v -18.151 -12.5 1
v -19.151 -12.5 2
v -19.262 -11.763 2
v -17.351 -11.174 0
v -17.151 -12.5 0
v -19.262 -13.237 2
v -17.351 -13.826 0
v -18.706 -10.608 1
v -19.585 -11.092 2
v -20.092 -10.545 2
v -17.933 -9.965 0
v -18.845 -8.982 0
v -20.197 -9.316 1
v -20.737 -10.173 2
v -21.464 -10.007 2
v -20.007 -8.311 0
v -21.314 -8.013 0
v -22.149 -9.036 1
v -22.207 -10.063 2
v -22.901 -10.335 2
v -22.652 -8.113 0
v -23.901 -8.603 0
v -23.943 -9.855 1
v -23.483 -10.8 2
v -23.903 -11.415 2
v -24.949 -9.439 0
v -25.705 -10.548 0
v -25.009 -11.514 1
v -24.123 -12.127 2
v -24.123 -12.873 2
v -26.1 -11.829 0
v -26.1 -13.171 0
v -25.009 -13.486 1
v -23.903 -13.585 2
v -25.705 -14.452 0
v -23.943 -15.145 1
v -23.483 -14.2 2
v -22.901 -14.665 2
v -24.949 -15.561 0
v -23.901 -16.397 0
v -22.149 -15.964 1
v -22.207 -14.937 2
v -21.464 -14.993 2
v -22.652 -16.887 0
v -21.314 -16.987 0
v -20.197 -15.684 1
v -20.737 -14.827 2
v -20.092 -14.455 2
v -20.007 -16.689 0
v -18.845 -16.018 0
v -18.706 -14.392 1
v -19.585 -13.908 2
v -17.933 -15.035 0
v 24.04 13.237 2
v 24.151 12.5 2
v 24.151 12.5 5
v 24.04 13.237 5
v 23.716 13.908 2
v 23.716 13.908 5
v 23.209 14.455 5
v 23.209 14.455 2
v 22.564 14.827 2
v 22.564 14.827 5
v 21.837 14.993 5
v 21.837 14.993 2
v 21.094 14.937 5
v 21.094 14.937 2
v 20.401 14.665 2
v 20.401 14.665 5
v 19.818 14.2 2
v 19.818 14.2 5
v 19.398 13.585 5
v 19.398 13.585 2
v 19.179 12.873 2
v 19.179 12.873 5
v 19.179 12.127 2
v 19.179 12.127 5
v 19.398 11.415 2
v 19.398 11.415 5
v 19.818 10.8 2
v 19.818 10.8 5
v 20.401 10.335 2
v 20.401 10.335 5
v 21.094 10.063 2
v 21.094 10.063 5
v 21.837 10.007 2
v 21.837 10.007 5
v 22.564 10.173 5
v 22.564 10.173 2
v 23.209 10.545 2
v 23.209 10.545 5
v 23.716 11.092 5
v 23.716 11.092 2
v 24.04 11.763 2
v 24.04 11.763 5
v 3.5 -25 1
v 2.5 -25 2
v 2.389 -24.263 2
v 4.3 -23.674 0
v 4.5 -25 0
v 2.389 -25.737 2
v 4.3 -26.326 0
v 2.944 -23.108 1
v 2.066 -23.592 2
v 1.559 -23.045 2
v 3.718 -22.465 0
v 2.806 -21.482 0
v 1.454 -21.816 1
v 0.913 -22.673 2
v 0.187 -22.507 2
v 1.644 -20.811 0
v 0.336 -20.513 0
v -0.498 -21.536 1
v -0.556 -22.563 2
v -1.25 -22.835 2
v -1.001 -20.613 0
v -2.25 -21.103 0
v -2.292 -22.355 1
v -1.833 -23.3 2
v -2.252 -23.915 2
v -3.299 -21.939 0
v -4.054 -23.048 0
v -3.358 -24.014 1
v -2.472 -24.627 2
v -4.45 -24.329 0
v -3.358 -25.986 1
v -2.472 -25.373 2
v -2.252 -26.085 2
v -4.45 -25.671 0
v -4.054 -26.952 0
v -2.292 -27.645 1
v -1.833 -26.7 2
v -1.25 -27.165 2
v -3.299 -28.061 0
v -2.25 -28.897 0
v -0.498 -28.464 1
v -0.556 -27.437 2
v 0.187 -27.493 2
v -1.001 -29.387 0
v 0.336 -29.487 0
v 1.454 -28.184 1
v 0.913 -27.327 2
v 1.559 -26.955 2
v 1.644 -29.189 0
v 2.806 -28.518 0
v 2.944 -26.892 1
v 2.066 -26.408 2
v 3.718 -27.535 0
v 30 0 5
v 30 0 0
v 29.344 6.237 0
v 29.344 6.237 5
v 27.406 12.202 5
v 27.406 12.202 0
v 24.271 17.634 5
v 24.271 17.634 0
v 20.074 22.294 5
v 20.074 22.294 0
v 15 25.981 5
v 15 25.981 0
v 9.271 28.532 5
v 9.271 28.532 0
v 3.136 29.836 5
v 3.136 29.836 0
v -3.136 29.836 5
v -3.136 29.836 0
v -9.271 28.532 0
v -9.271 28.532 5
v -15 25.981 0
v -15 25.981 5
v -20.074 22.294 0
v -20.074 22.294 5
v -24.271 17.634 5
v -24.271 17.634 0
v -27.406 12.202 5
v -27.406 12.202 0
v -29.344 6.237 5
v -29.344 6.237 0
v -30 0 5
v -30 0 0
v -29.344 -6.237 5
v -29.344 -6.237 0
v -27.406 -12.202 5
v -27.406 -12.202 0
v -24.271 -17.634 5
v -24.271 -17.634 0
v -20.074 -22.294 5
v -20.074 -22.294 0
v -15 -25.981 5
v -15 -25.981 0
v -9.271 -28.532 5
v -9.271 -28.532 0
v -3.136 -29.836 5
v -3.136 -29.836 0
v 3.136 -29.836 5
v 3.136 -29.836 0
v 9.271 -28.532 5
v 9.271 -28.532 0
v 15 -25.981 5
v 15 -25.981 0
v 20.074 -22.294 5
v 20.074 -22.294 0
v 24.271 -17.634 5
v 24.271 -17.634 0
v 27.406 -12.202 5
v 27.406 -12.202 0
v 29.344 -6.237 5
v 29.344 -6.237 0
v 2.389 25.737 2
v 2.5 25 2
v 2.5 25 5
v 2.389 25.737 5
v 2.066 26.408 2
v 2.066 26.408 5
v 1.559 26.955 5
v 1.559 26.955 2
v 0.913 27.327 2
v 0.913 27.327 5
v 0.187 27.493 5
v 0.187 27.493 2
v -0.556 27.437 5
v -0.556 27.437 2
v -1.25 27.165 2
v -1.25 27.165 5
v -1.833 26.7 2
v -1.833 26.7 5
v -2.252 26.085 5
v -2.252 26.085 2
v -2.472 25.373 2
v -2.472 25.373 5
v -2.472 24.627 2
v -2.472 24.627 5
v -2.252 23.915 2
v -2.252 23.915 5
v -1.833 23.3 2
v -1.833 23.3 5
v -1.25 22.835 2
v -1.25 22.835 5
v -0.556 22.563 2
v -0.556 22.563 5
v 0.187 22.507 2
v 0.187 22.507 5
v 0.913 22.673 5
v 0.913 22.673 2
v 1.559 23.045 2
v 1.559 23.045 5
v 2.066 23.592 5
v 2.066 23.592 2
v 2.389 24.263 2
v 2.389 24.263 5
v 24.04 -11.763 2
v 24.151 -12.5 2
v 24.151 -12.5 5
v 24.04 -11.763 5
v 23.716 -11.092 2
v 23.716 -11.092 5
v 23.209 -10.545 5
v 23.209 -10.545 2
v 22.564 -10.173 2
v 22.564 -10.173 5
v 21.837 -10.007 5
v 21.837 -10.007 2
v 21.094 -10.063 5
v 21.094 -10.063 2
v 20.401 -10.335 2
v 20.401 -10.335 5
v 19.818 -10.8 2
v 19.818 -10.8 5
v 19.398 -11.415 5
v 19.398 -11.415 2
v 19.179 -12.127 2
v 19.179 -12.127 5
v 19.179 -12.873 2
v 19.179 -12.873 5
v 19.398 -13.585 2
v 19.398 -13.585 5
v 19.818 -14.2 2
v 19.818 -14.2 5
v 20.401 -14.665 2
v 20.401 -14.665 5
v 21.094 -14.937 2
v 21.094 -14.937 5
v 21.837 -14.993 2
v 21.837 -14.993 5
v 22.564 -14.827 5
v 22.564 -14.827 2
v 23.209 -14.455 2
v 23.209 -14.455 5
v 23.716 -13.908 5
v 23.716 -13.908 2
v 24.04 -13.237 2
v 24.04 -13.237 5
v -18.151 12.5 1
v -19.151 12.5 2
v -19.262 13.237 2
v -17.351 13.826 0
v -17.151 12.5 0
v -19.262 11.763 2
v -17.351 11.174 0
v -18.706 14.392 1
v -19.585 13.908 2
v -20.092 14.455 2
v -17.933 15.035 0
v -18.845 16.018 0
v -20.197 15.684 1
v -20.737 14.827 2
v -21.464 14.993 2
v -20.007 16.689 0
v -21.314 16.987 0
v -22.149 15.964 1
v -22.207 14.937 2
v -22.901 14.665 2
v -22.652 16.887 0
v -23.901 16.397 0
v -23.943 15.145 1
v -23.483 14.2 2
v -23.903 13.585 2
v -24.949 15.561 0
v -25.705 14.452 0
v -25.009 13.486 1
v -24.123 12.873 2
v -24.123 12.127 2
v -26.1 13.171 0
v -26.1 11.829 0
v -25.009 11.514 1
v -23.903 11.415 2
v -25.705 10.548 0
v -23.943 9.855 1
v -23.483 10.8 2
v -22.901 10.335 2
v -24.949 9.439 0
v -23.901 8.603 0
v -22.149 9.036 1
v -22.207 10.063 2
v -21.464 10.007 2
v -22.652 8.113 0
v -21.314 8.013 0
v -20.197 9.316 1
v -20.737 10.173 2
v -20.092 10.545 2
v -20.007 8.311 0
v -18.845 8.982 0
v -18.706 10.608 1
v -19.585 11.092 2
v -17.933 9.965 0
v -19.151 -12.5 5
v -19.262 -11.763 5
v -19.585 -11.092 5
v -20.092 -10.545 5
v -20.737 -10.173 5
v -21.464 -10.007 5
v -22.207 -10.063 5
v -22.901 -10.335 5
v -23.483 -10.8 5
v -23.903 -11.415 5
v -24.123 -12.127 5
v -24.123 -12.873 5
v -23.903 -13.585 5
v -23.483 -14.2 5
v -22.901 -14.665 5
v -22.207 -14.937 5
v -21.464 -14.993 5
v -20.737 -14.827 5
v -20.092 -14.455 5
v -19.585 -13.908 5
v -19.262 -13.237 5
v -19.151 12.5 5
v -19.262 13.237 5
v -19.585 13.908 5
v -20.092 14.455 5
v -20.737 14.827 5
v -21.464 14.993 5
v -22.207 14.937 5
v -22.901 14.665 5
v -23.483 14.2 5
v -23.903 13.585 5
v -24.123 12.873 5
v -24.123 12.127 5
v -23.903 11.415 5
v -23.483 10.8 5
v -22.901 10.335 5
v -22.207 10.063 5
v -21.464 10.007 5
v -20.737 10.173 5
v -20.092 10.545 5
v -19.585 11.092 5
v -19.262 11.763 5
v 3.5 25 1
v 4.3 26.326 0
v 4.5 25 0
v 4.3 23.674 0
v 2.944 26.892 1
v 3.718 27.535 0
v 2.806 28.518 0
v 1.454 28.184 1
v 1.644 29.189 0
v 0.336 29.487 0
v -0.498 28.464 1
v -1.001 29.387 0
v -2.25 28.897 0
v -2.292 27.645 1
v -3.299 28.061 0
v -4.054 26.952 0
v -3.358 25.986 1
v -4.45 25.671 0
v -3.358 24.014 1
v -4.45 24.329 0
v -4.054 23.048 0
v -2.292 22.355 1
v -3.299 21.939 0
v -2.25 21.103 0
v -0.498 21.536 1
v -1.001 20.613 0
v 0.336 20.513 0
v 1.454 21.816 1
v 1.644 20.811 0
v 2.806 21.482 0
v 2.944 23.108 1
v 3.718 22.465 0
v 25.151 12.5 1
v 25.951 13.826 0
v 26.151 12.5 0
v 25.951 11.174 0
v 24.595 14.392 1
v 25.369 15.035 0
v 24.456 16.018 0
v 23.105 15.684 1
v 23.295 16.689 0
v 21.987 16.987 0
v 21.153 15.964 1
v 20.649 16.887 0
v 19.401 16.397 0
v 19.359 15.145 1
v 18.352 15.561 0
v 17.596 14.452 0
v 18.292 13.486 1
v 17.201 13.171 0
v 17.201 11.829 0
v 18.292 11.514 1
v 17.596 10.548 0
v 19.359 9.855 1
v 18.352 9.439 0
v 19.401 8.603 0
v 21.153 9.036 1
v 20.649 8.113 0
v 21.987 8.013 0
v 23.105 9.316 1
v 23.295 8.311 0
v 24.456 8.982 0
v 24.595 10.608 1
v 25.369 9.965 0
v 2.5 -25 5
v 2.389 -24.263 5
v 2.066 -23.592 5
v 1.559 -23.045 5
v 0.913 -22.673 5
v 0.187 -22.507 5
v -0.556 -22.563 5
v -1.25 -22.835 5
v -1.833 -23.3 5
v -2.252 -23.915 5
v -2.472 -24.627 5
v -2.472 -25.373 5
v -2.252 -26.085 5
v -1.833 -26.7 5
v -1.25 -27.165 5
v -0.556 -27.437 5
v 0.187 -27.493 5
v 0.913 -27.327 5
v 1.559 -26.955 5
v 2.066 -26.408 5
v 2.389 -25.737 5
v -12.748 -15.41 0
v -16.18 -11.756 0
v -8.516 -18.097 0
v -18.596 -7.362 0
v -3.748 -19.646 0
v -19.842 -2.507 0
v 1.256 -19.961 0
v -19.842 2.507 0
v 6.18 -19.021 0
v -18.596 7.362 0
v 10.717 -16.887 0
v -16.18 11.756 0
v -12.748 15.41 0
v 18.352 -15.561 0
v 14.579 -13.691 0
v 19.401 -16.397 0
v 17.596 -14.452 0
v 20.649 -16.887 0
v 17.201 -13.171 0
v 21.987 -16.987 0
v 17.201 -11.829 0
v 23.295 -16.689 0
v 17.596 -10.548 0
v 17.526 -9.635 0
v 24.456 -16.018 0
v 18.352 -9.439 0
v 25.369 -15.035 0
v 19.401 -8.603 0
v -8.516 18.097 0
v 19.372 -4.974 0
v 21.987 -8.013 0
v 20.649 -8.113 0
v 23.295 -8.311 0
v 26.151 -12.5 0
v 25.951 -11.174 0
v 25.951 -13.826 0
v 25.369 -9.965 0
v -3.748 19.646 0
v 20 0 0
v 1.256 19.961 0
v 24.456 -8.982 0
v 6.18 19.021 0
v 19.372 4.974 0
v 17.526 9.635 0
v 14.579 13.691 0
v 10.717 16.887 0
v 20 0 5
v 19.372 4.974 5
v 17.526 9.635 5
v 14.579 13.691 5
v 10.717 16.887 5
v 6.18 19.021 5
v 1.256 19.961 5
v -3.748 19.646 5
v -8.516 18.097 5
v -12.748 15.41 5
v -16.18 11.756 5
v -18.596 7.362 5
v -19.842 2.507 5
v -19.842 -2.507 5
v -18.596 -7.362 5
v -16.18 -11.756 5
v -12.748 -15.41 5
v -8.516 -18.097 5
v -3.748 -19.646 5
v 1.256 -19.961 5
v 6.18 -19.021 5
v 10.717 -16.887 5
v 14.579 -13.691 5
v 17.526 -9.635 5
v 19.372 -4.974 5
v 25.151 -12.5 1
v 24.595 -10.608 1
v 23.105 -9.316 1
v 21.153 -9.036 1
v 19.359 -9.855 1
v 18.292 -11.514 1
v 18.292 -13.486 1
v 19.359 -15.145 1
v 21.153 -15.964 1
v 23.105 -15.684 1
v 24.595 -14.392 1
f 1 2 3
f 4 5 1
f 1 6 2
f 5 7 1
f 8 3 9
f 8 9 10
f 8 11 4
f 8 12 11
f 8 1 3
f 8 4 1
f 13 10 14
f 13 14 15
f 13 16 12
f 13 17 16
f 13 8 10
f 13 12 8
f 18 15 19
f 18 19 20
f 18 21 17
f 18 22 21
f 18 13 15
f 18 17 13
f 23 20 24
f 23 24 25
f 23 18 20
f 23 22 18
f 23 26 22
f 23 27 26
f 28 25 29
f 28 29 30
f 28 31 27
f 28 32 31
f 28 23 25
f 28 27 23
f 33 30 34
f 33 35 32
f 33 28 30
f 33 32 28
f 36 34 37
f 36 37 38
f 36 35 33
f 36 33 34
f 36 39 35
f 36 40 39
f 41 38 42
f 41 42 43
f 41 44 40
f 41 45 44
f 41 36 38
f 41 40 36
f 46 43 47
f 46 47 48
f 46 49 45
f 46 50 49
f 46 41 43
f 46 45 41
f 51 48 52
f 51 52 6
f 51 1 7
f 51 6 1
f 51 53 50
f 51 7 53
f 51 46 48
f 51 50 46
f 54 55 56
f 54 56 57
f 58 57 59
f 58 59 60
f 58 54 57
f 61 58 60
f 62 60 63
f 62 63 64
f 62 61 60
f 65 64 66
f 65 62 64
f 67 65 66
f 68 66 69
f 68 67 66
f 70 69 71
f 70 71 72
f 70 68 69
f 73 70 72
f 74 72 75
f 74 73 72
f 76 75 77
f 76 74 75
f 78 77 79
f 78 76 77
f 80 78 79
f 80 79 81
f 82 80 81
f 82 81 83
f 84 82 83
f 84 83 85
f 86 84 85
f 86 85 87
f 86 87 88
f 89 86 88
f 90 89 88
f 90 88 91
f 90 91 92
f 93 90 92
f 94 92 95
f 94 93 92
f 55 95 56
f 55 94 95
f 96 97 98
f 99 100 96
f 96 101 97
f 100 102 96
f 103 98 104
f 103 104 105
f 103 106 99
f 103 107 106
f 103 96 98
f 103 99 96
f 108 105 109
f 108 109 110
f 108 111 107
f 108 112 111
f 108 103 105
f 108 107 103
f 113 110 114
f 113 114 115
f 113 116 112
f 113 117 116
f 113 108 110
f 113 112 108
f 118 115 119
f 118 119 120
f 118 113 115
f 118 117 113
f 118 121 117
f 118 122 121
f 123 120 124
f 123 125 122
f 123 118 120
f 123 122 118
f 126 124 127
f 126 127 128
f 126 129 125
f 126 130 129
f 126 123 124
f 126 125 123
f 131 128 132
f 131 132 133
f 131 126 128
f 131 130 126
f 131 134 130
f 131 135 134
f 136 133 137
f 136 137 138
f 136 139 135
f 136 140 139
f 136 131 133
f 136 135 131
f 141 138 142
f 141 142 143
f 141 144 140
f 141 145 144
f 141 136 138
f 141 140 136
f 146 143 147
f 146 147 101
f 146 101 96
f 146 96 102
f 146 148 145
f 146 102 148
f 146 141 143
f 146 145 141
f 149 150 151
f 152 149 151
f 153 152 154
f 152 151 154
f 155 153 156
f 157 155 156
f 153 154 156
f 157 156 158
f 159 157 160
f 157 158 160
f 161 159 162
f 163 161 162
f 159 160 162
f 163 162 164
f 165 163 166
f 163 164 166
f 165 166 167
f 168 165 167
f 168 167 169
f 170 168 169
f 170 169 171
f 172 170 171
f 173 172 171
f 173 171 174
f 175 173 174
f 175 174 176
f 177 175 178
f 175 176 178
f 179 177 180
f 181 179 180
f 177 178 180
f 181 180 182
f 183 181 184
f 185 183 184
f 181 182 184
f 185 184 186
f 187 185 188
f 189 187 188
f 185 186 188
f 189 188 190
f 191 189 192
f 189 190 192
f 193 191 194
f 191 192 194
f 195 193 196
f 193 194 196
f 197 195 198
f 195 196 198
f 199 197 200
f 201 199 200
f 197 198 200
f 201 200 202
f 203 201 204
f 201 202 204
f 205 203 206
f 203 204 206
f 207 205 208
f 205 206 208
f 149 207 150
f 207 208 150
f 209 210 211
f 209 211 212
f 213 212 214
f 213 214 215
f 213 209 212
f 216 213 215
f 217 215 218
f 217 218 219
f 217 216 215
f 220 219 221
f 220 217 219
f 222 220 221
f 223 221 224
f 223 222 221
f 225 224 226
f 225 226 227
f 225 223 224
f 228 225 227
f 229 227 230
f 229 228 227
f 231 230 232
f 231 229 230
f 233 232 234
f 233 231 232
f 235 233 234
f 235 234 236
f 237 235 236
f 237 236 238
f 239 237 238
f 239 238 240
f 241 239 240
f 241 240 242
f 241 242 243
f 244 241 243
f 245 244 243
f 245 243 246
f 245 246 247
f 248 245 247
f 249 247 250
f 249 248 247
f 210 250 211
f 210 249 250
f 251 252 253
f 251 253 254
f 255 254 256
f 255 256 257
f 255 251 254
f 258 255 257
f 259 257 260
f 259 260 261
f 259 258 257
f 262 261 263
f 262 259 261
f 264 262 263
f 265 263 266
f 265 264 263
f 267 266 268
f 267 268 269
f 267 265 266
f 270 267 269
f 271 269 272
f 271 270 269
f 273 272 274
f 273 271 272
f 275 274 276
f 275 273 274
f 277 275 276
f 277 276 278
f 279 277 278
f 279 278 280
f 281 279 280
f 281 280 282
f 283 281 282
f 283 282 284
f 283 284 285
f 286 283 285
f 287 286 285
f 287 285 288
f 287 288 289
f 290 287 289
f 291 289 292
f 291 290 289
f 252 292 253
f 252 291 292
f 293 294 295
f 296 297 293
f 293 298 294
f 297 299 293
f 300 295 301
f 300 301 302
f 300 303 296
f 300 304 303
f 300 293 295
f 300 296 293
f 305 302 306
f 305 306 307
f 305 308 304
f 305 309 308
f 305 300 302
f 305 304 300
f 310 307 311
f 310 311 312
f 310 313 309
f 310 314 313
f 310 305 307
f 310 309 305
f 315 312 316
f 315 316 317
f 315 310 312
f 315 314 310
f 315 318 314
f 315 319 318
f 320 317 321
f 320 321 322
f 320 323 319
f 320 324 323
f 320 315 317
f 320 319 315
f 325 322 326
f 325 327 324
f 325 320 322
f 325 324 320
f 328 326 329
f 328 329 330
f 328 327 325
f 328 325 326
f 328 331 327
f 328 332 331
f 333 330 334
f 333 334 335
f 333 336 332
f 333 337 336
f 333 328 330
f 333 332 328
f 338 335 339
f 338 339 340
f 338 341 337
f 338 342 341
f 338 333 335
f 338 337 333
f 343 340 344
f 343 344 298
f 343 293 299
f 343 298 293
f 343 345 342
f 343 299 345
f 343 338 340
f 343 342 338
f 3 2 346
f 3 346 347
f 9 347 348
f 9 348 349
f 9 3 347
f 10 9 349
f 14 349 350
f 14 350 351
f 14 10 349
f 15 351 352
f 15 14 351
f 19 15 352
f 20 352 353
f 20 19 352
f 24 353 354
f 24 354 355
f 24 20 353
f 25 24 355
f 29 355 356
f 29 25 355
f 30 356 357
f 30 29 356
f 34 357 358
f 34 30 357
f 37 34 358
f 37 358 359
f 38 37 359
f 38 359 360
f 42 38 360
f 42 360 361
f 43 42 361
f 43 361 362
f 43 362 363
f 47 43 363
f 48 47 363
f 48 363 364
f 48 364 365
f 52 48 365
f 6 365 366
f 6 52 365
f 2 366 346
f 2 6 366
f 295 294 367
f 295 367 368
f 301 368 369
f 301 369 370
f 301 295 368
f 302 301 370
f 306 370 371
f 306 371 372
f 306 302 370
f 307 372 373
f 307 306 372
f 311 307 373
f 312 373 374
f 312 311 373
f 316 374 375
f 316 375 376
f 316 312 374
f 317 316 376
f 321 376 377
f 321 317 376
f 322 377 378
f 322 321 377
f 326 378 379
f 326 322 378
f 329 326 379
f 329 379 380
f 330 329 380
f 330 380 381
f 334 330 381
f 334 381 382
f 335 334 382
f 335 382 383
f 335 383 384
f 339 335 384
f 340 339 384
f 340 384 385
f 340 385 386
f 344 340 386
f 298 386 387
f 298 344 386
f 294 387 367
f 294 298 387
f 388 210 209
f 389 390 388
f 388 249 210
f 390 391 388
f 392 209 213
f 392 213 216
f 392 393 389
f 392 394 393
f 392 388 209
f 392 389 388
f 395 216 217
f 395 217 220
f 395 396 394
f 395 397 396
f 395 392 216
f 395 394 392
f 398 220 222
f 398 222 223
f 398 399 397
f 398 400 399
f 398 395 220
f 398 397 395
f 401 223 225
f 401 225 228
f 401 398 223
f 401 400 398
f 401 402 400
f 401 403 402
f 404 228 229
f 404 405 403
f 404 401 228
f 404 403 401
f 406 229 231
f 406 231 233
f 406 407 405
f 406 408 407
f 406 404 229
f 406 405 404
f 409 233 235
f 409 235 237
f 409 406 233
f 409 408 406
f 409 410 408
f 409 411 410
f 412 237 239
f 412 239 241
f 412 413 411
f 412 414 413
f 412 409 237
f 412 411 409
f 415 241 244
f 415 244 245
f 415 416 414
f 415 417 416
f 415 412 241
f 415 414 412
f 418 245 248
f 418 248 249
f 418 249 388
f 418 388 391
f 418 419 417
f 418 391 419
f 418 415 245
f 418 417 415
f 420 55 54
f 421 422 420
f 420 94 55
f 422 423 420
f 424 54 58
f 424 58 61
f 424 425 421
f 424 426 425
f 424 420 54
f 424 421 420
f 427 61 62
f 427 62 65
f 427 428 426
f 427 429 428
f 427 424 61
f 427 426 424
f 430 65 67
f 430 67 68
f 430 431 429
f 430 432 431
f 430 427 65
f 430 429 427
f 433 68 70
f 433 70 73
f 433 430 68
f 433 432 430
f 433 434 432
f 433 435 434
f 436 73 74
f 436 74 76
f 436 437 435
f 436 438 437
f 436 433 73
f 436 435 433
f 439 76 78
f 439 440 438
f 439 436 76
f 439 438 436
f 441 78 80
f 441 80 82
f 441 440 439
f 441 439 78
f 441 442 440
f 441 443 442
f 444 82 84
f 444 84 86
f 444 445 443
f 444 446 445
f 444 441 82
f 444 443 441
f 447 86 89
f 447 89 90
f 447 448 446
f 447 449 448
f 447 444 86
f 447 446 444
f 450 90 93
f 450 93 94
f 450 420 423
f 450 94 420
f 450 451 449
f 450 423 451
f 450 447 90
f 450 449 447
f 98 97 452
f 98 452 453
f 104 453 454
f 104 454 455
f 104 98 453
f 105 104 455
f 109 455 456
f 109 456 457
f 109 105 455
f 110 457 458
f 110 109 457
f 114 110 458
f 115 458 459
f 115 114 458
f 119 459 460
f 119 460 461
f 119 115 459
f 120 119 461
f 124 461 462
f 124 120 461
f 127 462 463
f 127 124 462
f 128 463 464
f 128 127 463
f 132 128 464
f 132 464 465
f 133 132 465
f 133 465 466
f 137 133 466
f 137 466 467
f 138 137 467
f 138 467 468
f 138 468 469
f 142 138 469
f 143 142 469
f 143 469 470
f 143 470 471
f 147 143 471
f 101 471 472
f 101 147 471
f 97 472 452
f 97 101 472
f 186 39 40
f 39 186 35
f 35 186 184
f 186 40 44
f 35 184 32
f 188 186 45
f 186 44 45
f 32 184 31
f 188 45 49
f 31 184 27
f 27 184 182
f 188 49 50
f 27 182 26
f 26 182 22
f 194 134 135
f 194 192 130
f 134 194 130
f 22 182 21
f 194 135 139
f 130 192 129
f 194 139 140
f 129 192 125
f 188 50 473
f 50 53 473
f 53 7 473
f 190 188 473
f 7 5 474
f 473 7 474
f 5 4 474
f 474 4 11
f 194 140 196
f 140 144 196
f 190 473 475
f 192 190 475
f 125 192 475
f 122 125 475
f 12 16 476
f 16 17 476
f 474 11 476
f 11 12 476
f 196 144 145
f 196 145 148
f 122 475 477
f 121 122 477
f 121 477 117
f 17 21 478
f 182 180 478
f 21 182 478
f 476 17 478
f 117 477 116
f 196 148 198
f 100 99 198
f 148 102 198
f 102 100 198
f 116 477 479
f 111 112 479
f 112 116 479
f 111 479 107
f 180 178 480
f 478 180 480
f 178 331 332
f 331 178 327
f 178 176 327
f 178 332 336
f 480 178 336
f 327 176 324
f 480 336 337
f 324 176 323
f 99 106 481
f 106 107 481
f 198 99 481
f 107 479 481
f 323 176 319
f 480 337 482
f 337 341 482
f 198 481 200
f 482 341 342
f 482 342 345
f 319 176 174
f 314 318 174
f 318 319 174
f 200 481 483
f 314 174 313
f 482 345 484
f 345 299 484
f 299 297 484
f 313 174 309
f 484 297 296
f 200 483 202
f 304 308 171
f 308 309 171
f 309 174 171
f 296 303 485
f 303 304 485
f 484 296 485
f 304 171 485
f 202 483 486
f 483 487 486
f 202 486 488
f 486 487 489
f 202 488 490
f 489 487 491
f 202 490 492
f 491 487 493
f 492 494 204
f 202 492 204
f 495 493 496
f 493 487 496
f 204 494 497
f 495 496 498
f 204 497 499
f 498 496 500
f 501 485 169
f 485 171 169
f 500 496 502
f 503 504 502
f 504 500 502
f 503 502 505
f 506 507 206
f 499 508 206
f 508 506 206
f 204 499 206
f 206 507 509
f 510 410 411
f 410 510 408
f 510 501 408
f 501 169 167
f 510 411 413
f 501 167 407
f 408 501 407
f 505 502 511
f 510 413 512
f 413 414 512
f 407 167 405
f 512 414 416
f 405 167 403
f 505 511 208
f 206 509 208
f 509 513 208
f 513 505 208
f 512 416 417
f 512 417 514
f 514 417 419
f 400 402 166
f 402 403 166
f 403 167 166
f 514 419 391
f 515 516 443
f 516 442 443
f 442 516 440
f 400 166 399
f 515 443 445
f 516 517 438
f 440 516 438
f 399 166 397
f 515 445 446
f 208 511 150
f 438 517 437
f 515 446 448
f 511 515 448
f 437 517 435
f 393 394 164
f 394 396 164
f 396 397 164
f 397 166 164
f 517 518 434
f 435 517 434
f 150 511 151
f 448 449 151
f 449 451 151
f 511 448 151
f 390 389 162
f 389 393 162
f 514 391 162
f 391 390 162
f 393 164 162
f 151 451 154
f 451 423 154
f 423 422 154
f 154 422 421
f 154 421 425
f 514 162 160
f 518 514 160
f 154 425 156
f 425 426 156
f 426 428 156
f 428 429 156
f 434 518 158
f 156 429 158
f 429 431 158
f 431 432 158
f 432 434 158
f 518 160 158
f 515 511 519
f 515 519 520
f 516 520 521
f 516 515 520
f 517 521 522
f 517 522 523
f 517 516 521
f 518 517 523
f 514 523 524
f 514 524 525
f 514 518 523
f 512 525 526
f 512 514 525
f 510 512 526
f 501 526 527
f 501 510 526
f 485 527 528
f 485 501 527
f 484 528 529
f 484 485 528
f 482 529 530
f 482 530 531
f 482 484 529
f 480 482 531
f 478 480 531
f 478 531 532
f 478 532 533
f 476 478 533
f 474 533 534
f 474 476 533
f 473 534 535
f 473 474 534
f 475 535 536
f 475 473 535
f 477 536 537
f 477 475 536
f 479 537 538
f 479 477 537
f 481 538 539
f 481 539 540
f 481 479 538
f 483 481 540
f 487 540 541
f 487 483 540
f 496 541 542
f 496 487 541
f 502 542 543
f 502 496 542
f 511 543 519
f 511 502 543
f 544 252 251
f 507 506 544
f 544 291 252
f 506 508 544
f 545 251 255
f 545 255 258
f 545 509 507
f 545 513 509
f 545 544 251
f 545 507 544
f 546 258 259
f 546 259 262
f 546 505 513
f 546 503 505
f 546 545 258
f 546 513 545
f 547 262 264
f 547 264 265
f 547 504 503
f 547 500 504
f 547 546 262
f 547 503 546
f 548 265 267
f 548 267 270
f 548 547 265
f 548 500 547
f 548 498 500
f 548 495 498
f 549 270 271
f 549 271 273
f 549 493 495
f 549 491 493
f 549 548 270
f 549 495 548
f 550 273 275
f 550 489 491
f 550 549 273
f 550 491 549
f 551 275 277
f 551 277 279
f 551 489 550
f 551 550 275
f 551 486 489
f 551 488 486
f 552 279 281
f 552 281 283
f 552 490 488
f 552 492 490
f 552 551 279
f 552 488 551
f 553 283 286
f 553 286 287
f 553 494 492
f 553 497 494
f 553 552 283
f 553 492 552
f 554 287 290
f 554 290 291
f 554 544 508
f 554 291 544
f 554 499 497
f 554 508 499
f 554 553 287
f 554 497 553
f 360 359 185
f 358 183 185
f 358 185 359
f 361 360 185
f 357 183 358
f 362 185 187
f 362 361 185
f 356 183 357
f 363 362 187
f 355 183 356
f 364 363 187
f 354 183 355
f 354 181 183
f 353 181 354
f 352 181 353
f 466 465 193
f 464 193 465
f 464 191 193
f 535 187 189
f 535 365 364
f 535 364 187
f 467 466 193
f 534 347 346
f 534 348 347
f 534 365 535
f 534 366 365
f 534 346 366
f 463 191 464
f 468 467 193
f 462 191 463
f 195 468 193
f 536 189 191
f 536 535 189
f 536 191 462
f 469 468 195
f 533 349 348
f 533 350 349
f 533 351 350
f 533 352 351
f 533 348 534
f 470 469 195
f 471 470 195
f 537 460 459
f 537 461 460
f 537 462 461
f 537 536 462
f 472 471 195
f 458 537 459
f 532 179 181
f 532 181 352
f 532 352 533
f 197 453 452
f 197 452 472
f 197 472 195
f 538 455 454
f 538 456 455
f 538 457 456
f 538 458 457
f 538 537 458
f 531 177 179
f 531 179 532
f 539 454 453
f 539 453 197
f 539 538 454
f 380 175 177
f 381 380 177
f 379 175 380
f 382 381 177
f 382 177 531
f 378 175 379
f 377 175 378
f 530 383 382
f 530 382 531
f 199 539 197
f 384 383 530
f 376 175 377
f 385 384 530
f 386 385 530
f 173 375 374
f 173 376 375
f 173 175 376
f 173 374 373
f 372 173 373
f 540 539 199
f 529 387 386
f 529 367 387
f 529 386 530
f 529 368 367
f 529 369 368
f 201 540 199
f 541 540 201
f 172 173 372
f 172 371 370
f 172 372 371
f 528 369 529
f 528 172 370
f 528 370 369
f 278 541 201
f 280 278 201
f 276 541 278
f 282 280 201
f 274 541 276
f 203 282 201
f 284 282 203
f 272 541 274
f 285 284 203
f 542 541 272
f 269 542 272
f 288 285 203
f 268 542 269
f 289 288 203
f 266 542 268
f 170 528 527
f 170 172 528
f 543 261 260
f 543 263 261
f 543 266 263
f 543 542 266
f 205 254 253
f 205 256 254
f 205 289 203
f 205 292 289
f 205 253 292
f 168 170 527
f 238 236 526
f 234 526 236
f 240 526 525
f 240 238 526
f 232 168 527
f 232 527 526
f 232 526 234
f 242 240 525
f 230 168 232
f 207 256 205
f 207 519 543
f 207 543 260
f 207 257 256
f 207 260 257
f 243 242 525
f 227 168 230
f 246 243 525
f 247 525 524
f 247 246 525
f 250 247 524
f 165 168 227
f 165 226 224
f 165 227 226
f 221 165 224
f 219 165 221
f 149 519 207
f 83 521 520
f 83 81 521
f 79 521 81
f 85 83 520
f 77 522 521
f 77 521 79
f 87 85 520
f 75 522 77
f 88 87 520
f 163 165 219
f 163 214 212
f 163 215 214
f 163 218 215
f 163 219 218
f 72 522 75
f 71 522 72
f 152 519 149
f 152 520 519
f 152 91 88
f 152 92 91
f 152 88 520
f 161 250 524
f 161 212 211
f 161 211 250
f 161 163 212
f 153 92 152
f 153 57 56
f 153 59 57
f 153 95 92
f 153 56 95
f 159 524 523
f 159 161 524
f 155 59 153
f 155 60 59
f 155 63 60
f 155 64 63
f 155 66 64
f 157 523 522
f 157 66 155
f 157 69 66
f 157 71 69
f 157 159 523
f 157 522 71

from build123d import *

# Parameters (mm, degrees)
SKETCH1_R           = 30
SKETCH1_R_2         = 20
SKETCH1_R_3         = 2.5
BOSS_EXTRUDE1_DEPTH = 5
CHAMFER1_SIZE       = 2


with BuildPart() as part:
    # Sketch1 → Boss-Extrude1 (new body)
    with BuildSketch(Plane.XY):
        Circle(SKETCH1_R)
        Circle(SKETCH1_R_2, mode=Mode.SUBTRACT)
        with Locations((0, 25)):
            Circle(SKETCH1_R_3, mode=Mode.SUBTRACT)
        with Locations((21.650635095, 12.5)):
            Circle(SKETCH1_R_3, mode=Mode.SUBTRACT)
        with Locations((21.650635095, -12.5)):
            Circle(SKETCH1_R_3, mode=Mode.SUBTRACT)
        with Locations((0, -25)):
            Circle(SKETCH1_R_3, mode=Mode.SUBTRACT)
        with Locations((-21.650635095, -12.5)):
            Circle(SKETCH1_R_3, mode=Mode.SUBTRACT)
        with Locations((-21.650635095, 12.5)):
            Circle(SKETCH1_R_3, mode=Mode.SUBTRACT)
    extrude(amount=BOSS_EXTRUDE1_DEPTH)

    # Chamfer1
    chamfer1_edges = [part.edges().sort_by_distance(p)[0] for p in [
        (19.150635095, -12.5, 0),
        (-2.5, -25, 0),
        (-24.150635095, -12.5, 0),
        (-24.150635095, 12.5, 0),
        (-2.5, 25, 0),
        (19.150635095, 12.5, 0),
    ]]
    chamfer(chamfer1_edges, length=CHAMFER1_SIZE)


solid = part.part
